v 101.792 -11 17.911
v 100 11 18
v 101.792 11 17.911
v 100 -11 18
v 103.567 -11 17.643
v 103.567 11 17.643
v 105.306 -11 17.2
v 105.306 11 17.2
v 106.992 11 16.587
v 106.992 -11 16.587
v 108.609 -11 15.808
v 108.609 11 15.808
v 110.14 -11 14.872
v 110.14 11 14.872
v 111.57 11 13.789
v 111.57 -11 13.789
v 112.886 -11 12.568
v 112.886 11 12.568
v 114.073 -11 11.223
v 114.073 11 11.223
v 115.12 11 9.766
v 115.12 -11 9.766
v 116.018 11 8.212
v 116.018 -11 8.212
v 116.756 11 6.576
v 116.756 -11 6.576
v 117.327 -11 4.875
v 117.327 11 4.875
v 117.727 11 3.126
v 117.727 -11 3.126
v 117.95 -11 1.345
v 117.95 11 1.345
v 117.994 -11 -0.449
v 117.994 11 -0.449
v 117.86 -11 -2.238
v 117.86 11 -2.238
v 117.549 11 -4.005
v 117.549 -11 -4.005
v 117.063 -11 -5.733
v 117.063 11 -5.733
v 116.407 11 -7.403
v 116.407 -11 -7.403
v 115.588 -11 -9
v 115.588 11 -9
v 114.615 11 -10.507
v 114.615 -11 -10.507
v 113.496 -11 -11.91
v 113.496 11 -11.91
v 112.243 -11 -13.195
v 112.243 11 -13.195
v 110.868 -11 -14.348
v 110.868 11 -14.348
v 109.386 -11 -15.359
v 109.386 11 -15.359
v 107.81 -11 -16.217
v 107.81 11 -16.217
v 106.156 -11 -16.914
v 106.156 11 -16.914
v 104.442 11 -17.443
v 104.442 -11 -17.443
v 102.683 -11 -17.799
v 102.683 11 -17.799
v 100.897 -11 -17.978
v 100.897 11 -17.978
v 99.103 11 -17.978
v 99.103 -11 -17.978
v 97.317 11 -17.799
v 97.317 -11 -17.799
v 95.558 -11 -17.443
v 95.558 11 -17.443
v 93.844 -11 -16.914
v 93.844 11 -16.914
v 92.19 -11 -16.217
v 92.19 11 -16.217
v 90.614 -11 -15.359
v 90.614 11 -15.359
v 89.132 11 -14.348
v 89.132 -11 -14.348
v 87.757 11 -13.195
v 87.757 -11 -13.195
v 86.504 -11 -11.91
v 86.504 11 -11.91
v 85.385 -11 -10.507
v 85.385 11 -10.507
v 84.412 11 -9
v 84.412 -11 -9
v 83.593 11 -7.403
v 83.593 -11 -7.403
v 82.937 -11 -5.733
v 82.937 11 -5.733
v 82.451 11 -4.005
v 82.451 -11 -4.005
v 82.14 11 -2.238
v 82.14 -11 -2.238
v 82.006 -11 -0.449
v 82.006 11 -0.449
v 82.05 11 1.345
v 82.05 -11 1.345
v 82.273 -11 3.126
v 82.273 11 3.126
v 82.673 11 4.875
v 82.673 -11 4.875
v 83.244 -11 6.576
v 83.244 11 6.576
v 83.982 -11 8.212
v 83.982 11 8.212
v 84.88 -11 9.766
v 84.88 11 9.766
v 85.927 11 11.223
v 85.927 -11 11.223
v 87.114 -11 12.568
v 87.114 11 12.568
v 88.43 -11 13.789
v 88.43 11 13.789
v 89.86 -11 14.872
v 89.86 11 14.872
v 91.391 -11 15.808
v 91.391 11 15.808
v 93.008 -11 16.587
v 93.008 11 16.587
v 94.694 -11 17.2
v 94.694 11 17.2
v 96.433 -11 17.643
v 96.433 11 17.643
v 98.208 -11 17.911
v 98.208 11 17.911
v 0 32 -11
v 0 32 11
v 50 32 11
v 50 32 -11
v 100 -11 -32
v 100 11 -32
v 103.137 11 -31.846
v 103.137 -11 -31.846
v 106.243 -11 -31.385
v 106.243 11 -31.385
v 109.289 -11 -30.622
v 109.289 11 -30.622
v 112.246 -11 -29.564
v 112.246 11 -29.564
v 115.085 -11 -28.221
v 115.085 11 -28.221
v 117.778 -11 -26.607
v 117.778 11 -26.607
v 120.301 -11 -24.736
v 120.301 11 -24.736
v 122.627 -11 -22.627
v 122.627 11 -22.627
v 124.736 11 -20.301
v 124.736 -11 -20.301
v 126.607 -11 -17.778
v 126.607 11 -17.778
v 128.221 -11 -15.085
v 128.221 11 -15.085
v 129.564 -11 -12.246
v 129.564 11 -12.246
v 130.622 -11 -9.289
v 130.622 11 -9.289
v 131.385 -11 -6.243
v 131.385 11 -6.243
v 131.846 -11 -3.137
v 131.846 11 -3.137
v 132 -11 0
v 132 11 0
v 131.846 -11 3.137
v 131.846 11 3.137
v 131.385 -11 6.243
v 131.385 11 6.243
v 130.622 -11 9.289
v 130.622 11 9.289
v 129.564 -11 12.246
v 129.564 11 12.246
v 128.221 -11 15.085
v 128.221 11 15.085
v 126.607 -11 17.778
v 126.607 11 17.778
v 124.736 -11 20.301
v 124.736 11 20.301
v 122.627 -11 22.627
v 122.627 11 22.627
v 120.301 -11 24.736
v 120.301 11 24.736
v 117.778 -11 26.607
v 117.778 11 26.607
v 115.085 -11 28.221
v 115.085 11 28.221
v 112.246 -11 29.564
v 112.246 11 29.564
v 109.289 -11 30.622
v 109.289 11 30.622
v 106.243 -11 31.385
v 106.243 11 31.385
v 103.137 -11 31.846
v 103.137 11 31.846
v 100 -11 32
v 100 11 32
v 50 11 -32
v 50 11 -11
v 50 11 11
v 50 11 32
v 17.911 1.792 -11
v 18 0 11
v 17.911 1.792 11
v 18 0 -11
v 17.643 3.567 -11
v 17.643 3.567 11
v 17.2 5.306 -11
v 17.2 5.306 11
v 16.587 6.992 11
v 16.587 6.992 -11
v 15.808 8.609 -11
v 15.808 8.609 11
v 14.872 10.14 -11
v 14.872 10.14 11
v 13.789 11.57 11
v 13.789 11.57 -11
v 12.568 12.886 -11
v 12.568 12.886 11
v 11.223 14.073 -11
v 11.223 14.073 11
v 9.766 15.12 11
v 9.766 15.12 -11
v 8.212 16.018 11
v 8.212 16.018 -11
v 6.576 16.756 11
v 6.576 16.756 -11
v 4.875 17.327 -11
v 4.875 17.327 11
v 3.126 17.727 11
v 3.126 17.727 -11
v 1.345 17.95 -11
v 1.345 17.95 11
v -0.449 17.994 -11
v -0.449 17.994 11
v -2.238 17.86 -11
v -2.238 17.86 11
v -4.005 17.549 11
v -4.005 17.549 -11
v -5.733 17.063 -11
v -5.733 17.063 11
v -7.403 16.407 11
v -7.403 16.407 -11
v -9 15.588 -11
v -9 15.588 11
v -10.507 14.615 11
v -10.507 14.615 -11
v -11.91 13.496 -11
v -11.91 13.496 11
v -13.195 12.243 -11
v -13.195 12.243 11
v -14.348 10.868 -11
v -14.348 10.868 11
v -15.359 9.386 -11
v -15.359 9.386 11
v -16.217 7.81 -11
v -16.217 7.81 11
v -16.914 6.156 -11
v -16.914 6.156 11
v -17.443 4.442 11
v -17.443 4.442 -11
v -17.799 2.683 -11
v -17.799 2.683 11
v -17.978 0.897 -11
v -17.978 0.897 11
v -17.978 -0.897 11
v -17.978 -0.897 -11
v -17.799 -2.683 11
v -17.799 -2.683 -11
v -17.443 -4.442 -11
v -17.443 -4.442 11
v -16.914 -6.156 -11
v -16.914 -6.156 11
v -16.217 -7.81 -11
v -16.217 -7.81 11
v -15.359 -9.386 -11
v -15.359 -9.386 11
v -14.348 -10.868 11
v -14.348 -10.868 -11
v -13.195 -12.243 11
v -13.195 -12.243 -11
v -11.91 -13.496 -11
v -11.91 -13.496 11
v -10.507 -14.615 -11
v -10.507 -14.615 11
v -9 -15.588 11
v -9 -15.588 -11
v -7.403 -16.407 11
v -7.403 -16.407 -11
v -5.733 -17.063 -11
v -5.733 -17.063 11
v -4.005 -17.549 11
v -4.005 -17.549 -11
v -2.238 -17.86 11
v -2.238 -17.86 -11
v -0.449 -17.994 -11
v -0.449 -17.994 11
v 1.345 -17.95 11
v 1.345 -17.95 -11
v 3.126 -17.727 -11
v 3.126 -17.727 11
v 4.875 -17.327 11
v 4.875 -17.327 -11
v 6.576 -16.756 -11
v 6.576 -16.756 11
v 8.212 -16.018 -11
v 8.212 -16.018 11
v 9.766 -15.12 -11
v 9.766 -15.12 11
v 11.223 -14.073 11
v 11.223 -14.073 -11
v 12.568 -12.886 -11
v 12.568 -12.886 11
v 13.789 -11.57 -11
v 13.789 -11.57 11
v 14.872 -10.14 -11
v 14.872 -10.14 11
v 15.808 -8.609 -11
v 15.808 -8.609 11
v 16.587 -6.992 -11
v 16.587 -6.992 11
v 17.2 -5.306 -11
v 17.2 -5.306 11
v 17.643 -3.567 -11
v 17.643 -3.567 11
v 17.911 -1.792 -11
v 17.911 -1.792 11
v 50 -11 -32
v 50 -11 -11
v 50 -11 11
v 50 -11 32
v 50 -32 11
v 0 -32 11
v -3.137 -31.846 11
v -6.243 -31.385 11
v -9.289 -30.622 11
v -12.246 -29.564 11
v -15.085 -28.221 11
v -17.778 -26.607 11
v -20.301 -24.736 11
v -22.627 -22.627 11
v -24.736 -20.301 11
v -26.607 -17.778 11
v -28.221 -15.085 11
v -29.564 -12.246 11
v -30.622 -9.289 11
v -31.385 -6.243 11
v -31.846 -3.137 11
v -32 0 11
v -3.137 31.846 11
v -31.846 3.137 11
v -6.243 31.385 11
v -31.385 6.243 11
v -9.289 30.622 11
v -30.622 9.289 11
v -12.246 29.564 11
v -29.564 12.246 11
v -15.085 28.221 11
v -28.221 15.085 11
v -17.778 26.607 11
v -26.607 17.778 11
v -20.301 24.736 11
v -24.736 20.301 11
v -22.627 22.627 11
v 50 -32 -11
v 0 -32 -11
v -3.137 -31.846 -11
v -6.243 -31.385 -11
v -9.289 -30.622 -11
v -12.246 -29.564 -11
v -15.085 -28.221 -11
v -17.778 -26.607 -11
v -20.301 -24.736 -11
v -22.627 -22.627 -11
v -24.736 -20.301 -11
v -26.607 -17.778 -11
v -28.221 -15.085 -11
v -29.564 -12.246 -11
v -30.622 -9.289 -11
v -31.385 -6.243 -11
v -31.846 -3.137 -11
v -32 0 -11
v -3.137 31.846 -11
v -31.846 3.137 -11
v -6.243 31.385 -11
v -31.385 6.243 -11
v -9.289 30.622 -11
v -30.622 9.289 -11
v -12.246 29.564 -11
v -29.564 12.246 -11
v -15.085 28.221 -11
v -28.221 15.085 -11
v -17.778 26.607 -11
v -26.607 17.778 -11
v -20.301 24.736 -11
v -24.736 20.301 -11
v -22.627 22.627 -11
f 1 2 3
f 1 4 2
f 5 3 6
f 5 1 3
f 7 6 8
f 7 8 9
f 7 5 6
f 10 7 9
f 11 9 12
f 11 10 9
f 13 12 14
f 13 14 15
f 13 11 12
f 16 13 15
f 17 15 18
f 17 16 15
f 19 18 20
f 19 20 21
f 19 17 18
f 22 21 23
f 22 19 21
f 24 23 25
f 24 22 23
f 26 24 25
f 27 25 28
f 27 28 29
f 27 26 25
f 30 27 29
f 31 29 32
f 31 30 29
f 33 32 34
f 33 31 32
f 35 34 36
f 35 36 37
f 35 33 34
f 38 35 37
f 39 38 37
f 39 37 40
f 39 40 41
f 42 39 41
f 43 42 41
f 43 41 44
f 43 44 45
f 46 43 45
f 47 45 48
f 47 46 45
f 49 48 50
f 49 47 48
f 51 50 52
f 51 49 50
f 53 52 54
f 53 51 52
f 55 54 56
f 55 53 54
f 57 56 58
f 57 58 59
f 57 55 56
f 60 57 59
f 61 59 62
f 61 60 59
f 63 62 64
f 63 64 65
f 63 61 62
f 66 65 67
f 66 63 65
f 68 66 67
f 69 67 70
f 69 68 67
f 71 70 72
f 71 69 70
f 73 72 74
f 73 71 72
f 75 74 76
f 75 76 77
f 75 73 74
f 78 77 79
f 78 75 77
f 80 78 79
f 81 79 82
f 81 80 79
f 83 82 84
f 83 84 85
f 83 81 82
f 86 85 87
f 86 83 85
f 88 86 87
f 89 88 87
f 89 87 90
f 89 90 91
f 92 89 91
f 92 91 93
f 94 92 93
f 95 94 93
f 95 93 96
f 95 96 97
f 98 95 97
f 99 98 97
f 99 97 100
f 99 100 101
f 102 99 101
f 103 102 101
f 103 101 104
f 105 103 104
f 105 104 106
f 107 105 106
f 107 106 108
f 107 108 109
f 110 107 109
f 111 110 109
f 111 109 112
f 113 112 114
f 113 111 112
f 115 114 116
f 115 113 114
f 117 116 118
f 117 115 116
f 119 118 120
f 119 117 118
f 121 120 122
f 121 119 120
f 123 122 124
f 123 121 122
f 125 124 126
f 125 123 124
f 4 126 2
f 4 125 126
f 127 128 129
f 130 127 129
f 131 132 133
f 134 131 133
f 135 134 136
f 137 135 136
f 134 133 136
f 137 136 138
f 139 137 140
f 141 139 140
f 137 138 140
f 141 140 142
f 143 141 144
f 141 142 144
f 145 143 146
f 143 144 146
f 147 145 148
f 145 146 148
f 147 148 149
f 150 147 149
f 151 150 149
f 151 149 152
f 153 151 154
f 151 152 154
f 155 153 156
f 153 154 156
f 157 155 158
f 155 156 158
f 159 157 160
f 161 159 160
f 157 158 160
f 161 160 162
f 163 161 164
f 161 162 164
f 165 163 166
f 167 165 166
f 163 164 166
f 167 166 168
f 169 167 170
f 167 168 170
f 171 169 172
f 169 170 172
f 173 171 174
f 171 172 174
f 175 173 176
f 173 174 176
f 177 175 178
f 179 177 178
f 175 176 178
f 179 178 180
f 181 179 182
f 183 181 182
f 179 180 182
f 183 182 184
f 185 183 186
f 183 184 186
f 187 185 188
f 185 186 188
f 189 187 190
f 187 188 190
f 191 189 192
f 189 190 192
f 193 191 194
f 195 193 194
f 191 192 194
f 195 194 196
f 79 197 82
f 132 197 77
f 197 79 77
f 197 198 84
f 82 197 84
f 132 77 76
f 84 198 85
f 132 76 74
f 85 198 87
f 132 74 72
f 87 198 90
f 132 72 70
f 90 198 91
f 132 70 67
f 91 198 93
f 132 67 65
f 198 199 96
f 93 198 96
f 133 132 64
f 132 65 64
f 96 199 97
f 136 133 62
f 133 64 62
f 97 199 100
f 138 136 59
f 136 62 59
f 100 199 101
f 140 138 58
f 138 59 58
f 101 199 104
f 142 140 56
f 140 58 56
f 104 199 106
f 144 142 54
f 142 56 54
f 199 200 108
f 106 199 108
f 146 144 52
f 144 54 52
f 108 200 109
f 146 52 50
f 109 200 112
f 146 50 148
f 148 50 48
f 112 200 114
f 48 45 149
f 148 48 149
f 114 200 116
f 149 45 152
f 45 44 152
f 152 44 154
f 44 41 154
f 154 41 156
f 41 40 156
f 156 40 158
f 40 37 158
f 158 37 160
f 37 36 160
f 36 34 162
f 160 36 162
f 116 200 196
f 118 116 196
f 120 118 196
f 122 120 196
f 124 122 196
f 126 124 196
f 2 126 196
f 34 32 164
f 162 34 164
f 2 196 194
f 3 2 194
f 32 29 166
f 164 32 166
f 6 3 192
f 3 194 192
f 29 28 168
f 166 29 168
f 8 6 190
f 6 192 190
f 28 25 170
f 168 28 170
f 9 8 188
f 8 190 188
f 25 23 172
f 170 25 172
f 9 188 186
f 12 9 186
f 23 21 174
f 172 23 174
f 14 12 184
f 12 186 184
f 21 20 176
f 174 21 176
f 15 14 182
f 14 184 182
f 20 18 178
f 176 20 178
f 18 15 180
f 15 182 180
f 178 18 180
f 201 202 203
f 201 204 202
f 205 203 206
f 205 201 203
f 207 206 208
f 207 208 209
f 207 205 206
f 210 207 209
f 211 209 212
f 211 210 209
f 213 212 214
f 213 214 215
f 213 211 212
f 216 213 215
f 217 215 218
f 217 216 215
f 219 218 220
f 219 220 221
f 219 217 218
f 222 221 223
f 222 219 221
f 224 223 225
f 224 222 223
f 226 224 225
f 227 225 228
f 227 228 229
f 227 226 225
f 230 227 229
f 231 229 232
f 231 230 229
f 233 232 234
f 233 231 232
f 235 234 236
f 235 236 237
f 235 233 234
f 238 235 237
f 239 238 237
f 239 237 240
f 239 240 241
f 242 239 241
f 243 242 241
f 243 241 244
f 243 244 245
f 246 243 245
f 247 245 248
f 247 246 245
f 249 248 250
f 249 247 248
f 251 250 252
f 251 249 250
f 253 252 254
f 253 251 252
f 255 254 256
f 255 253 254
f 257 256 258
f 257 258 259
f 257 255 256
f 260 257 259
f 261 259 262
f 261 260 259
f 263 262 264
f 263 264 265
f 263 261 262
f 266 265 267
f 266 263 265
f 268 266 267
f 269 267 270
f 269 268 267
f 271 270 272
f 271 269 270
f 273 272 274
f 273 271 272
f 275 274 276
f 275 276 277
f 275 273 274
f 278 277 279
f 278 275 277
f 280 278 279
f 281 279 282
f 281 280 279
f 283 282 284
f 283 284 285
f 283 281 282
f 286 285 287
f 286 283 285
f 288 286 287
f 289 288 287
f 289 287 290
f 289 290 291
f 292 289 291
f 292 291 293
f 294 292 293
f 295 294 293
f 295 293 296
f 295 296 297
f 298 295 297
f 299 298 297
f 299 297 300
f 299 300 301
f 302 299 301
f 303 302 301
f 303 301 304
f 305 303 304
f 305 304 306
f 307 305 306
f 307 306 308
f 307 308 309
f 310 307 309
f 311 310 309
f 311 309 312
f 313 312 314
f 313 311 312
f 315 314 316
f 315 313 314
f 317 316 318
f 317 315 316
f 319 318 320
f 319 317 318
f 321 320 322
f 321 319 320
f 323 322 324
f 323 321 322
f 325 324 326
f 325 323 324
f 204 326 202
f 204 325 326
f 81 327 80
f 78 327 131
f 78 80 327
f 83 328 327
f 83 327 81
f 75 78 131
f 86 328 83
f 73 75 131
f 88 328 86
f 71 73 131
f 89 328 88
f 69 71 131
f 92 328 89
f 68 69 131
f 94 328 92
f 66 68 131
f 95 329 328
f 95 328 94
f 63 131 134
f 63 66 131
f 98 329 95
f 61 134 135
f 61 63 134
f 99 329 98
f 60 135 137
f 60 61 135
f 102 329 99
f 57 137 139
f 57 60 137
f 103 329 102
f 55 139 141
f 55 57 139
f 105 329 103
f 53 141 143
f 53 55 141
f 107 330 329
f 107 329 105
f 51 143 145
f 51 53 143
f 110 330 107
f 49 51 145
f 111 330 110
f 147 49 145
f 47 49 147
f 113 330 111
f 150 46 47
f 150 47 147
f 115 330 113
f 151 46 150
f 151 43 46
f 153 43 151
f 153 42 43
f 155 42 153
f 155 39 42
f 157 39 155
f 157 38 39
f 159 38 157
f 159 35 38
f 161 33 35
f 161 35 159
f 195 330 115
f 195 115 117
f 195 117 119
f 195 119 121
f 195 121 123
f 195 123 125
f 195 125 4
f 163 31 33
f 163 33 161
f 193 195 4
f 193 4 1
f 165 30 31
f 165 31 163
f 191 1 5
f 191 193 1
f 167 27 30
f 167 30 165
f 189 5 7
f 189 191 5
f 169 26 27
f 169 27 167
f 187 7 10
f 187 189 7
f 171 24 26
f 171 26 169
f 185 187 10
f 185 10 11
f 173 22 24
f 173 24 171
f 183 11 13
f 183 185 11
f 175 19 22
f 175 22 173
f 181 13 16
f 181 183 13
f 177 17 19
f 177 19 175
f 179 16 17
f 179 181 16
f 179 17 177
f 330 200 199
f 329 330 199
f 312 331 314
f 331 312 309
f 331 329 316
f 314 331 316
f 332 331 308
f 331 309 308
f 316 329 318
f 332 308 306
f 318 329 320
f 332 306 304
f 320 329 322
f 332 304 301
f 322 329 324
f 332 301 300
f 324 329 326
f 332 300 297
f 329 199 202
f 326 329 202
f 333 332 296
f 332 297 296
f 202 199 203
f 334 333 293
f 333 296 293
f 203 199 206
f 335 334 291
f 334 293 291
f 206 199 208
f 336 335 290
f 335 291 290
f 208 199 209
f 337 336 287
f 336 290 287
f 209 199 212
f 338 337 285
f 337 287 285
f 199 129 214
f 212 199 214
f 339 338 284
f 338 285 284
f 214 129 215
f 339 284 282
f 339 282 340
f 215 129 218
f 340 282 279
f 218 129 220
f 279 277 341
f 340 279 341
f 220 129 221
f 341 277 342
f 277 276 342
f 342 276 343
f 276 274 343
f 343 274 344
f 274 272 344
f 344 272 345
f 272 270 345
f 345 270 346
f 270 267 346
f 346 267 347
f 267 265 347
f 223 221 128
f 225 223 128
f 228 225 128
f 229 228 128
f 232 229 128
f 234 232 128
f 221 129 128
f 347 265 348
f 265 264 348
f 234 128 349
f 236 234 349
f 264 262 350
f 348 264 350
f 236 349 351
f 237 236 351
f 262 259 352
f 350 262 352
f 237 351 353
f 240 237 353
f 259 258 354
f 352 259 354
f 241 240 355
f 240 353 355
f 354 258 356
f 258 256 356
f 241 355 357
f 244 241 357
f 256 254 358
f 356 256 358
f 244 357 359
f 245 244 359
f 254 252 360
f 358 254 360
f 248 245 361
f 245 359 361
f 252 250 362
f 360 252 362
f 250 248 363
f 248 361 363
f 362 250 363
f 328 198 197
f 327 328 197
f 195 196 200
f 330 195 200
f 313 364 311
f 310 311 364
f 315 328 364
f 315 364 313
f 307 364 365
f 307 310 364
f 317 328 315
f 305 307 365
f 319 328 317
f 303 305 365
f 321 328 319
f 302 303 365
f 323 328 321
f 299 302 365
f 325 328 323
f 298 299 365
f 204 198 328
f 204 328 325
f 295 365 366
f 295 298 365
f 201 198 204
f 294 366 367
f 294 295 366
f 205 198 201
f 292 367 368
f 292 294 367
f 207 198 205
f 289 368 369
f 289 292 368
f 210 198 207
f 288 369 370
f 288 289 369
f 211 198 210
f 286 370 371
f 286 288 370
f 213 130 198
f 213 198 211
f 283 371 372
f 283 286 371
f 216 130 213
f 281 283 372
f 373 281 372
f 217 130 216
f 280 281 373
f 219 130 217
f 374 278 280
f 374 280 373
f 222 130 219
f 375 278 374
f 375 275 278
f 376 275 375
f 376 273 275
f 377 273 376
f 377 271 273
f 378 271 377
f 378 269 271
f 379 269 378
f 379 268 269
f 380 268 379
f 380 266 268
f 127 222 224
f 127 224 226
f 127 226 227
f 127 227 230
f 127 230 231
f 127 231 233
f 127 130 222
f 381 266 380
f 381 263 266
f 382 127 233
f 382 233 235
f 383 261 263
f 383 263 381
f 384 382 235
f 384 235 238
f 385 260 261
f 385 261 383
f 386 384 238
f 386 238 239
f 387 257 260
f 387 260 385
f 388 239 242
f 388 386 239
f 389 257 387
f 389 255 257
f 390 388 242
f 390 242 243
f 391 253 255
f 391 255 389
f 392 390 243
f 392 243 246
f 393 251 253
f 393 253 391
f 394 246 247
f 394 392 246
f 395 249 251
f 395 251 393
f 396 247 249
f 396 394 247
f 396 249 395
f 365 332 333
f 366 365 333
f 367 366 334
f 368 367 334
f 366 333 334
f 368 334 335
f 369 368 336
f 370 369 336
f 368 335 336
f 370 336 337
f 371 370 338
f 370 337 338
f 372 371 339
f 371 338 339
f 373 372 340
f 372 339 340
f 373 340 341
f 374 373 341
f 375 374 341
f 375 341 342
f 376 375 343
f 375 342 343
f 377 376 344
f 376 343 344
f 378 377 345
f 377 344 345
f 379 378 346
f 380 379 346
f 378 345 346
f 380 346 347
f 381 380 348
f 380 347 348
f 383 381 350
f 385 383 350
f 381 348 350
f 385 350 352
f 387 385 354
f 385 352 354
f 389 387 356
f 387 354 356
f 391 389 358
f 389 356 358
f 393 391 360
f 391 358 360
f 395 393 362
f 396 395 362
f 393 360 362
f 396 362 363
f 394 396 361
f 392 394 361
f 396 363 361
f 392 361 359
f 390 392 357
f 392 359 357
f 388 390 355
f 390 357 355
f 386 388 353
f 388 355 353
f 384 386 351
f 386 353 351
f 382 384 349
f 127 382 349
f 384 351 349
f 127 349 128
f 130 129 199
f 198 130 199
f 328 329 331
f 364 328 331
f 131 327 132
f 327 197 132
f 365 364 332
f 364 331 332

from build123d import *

# Parameters (mm, degrees)
SKETCH1_R           = 18
BOSS_EXTRUDE1_DEPTH = 11
SKETCH2_R           = 18
BOSS_EXTRUDE2_DEPTH = 11


with BuildPart() as part:
    # Sketch1 → Boss-Extrude1 (new, symmetric)
    with BuildSketch(Plane.XY):
        with BuildLine():
            Line((0, 32), (50, 32))
            Line((50, 32), (50, -32))
            Line((50, -32), (0, -32))
            ThreePointArc((0, -32), (-32, 0), (0, 32))
        make_face()
        Circle(SKETCH1_R, mode=Mode.SUBTRACT)
    extrude(amount=BOSS_EXTRUDE1_DEPTH, both=True)

    # Sketch2 → Boss-Extrude2 (add, symmetric)
    with BuildSketch(Plane(origin=(100, 0, 0), x_dir=(-1, 0, 0), z_dir=(0, 1, 0))):
        with BuildLine():
            Line((0, 32), (50, 32))
            Line((50, 32), (50, -32))
            Line((50, -32), (0, -32))
            ThreePointArc((0, -32), (-32, 0), (0, 32))
        make_face()
        with Locations(Location((0, 0, 0), (0, 0, 90))):
            Circle(SKETCH2_R, mode=Mode.SUBTRACT)
    extrude(amount=BOSS_EXTRUDE2_DEPTH, both=True)


solid = part.part
